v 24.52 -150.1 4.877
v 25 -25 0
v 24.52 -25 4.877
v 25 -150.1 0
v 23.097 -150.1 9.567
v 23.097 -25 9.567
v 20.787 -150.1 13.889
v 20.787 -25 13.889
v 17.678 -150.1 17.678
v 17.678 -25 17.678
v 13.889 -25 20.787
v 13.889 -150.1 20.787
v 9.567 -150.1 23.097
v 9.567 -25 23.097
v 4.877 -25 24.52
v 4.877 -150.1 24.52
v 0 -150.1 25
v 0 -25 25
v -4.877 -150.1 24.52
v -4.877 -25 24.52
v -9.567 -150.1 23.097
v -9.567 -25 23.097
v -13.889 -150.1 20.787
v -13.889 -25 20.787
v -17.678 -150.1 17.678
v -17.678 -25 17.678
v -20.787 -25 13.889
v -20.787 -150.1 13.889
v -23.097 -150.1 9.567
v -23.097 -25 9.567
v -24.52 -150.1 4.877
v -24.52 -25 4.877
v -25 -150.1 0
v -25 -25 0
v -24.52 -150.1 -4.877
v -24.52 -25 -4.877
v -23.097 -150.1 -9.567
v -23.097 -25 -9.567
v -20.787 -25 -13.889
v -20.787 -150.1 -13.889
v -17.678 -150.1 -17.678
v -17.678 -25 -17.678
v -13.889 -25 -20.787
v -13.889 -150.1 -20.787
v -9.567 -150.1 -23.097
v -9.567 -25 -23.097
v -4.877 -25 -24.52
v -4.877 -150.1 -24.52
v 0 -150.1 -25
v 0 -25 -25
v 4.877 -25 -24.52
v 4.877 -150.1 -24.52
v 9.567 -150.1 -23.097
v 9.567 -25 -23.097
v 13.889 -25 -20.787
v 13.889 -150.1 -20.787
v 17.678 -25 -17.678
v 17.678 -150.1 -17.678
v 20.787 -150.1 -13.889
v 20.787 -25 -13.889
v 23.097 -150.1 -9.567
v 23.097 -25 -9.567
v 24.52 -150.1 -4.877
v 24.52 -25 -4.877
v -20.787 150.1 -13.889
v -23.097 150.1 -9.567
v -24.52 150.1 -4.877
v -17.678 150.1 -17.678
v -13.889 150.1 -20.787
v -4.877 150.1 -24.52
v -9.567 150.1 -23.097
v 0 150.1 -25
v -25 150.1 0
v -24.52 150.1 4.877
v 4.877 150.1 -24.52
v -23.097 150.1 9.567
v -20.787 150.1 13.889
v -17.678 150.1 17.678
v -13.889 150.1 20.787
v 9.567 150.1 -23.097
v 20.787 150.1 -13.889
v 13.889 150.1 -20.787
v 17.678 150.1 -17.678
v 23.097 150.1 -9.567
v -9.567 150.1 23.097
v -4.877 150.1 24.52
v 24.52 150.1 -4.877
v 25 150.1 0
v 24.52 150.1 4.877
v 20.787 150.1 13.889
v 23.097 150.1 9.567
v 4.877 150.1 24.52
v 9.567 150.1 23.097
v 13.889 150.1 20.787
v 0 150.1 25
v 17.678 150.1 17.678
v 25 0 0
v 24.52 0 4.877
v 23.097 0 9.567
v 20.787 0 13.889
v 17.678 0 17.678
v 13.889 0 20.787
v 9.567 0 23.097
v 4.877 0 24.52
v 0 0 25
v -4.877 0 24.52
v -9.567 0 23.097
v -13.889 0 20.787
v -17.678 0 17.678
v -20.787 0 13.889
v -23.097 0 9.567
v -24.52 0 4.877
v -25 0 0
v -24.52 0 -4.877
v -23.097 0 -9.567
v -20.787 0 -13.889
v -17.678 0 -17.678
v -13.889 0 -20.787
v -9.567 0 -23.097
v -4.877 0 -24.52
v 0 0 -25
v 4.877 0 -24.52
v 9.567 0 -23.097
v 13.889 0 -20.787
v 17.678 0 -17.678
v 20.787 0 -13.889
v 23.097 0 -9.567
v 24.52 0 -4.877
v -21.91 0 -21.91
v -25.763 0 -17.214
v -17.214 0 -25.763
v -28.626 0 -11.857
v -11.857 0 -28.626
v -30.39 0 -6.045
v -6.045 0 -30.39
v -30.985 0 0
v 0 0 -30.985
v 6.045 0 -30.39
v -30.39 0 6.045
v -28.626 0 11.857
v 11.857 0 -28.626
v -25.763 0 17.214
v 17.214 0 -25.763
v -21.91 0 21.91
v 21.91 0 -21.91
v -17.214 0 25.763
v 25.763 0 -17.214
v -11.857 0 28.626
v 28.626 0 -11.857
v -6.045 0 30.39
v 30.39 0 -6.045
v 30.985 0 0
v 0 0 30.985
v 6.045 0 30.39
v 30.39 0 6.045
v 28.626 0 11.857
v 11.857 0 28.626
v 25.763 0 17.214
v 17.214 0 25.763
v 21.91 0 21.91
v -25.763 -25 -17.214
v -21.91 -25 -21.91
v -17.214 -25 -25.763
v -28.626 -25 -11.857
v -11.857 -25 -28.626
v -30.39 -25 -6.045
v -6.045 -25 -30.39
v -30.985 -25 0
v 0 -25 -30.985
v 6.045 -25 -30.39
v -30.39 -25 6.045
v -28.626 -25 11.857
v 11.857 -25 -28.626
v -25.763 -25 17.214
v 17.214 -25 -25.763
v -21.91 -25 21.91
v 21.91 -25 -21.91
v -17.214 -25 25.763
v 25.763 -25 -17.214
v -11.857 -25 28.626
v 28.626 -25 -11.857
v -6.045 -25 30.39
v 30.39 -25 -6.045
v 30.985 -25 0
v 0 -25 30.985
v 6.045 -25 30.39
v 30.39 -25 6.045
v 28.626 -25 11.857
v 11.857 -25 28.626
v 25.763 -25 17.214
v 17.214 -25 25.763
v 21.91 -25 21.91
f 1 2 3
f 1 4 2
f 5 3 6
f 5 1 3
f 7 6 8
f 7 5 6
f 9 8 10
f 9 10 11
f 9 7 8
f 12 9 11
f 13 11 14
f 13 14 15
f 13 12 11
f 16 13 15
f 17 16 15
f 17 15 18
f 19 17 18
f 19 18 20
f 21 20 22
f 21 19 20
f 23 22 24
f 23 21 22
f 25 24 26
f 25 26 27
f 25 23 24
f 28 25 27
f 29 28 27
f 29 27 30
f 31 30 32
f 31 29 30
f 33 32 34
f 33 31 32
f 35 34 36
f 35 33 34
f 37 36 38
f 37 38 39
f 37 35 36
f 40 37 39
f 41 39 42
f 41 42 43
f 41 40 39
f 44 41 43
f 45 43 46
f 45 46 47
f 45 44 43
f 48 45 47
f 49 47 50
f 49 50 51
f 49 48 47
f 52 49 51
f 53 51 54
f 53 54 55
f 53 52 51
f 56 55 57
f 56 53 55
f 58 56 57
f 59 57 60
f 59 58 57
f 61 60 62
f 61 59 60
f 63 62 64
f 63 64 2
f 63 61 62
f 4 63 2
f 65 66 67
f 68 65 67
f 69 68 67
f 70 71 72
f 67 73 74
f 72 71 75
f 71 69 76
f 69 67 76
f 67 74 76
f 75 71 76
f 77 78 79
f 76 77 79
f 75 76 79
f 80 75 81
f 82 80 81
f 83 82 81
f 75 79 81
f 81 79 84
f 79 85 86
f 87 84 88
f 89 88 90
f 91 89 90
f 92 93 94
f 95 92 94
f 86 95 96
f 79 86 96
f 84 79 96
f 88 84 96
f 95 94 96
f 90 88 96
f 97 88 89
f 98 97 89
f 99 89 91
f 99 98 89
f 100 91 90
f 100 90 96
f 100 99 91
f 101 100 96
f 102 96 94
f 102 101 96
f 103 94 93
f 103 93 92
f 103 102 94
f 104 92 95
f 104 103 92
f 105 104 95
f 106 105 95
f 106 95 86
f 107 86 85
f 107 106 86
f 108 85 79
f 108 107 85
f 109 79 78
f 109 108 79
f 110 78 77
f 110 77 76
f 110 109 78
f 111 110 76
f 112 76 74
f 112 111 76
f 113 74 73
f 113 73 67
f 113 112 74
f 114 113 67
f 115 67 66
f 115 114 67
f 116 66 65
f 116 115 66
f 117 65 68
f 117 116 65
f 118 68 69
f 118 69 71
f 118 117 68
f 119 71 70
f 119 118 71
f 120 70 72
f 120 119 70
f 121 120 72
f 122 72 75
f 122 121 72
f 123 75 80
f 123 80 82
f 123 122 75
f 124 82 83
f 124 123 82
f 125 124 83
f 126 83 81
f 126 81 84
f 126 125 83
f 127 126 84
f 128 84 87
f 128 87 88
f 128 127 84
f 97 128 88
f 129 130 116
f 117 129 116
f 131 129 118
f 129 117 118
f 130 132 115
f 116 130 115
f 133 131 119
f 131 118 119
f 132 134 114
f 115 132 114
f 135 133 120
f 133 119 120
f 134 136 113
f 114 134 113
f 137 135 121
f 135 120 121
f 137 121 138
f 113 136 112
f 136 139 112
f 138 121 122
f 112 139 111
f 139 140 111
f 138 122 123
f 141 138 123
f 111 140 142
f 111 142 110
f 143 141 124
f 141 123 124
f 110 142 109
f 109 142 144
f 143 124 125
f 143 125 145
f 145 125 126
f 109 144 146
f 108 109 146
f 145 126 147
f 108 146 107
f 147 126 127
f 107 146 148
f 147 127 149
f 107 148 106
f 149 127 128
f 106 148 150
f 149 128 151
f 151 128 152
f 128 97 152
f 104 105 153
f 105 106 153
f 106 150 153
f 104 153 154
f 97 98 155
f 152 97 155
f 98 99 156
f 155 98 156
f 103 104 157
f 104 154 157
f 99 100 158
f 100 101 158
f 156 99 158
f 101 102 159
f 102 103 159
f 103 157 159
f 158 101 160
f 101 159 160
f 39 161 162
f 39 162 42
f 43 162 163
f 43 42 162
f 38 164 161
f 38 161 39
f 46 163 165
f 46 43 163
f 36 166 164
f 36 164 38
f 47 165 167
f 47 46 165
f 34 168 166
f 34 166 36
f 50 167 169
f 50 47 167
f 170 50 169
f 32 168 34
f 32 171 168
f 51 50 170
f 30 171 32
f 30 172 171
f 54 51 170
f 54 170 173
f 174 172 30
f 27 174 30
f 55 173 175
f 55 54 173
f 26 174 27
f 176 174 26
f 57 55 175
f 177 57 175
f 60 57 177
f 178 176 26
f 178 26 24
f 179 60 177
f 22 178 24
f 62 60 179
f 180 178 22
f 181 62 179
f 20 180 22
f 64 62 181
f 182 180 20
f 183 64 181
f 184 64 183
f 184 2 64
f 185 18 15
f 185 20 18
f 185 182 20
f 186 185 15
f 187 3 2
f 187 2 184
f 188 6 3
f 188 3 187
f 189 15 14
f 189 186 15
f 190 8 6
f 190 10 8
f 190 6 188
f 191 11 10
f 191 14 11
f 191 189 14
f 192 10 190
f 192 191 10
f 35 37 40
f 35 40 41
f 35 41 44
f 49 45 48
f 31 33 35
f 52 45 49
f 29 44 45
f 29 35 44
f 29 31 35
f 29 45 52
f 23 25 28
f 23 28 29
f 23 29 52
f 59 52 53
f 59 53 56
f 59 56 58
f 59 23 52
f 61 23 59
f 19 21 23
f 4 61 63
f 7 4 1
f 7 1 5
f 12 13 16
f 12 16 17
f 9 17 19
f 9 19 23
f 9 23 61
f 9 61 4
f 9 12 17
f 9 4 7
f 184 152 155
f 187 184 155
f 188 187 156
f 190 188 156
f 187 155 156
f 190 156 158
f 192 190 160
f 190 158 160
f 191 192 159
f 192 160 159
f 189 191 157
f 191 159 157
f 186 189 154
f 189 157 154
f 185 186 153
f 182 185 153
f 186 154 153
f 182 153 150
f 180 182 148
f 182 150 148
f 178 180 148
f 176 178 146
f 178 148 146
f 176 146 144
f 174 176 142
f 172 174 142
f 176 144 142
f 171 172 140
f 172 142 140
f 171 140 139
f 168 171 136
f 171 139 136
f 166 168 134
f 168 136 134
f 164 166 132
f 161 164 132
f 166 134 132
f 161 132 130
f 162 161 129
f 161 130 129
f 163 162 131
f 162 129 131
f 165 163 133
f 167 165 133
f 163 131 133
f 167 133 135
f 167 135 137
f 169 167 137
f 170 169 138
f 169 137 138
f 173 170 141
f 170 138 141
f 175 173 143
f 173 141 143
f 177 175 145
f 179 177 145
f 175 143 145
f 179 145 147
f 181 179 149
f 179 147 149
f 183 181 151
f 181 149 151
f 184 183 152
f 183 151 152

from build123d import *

# Parameters (mm, degrees)
F0_R     = 25
F1_DEPTH = 150.1
F2_R     = 30.985026
F2_R_2   = 25
F3_DEPTH = 25


with BuildPart() as f1:
    # F0 (on Front) → F1 (new body, symmetric)
    with BuildSketch(Plane.XZ):
        Circle(F0_R)
    extrude(amount=F1_DEPTH, both=True)

    # F2 (on Front) → F3 (join)
    with BuildSketch(Plane.XZ):
        Circle(F2_R)
        Circle(F2_R_2, mode=Mode.SUBTRACT)
    extrude(amount=F3_DEPTH)


solid = f1.part
